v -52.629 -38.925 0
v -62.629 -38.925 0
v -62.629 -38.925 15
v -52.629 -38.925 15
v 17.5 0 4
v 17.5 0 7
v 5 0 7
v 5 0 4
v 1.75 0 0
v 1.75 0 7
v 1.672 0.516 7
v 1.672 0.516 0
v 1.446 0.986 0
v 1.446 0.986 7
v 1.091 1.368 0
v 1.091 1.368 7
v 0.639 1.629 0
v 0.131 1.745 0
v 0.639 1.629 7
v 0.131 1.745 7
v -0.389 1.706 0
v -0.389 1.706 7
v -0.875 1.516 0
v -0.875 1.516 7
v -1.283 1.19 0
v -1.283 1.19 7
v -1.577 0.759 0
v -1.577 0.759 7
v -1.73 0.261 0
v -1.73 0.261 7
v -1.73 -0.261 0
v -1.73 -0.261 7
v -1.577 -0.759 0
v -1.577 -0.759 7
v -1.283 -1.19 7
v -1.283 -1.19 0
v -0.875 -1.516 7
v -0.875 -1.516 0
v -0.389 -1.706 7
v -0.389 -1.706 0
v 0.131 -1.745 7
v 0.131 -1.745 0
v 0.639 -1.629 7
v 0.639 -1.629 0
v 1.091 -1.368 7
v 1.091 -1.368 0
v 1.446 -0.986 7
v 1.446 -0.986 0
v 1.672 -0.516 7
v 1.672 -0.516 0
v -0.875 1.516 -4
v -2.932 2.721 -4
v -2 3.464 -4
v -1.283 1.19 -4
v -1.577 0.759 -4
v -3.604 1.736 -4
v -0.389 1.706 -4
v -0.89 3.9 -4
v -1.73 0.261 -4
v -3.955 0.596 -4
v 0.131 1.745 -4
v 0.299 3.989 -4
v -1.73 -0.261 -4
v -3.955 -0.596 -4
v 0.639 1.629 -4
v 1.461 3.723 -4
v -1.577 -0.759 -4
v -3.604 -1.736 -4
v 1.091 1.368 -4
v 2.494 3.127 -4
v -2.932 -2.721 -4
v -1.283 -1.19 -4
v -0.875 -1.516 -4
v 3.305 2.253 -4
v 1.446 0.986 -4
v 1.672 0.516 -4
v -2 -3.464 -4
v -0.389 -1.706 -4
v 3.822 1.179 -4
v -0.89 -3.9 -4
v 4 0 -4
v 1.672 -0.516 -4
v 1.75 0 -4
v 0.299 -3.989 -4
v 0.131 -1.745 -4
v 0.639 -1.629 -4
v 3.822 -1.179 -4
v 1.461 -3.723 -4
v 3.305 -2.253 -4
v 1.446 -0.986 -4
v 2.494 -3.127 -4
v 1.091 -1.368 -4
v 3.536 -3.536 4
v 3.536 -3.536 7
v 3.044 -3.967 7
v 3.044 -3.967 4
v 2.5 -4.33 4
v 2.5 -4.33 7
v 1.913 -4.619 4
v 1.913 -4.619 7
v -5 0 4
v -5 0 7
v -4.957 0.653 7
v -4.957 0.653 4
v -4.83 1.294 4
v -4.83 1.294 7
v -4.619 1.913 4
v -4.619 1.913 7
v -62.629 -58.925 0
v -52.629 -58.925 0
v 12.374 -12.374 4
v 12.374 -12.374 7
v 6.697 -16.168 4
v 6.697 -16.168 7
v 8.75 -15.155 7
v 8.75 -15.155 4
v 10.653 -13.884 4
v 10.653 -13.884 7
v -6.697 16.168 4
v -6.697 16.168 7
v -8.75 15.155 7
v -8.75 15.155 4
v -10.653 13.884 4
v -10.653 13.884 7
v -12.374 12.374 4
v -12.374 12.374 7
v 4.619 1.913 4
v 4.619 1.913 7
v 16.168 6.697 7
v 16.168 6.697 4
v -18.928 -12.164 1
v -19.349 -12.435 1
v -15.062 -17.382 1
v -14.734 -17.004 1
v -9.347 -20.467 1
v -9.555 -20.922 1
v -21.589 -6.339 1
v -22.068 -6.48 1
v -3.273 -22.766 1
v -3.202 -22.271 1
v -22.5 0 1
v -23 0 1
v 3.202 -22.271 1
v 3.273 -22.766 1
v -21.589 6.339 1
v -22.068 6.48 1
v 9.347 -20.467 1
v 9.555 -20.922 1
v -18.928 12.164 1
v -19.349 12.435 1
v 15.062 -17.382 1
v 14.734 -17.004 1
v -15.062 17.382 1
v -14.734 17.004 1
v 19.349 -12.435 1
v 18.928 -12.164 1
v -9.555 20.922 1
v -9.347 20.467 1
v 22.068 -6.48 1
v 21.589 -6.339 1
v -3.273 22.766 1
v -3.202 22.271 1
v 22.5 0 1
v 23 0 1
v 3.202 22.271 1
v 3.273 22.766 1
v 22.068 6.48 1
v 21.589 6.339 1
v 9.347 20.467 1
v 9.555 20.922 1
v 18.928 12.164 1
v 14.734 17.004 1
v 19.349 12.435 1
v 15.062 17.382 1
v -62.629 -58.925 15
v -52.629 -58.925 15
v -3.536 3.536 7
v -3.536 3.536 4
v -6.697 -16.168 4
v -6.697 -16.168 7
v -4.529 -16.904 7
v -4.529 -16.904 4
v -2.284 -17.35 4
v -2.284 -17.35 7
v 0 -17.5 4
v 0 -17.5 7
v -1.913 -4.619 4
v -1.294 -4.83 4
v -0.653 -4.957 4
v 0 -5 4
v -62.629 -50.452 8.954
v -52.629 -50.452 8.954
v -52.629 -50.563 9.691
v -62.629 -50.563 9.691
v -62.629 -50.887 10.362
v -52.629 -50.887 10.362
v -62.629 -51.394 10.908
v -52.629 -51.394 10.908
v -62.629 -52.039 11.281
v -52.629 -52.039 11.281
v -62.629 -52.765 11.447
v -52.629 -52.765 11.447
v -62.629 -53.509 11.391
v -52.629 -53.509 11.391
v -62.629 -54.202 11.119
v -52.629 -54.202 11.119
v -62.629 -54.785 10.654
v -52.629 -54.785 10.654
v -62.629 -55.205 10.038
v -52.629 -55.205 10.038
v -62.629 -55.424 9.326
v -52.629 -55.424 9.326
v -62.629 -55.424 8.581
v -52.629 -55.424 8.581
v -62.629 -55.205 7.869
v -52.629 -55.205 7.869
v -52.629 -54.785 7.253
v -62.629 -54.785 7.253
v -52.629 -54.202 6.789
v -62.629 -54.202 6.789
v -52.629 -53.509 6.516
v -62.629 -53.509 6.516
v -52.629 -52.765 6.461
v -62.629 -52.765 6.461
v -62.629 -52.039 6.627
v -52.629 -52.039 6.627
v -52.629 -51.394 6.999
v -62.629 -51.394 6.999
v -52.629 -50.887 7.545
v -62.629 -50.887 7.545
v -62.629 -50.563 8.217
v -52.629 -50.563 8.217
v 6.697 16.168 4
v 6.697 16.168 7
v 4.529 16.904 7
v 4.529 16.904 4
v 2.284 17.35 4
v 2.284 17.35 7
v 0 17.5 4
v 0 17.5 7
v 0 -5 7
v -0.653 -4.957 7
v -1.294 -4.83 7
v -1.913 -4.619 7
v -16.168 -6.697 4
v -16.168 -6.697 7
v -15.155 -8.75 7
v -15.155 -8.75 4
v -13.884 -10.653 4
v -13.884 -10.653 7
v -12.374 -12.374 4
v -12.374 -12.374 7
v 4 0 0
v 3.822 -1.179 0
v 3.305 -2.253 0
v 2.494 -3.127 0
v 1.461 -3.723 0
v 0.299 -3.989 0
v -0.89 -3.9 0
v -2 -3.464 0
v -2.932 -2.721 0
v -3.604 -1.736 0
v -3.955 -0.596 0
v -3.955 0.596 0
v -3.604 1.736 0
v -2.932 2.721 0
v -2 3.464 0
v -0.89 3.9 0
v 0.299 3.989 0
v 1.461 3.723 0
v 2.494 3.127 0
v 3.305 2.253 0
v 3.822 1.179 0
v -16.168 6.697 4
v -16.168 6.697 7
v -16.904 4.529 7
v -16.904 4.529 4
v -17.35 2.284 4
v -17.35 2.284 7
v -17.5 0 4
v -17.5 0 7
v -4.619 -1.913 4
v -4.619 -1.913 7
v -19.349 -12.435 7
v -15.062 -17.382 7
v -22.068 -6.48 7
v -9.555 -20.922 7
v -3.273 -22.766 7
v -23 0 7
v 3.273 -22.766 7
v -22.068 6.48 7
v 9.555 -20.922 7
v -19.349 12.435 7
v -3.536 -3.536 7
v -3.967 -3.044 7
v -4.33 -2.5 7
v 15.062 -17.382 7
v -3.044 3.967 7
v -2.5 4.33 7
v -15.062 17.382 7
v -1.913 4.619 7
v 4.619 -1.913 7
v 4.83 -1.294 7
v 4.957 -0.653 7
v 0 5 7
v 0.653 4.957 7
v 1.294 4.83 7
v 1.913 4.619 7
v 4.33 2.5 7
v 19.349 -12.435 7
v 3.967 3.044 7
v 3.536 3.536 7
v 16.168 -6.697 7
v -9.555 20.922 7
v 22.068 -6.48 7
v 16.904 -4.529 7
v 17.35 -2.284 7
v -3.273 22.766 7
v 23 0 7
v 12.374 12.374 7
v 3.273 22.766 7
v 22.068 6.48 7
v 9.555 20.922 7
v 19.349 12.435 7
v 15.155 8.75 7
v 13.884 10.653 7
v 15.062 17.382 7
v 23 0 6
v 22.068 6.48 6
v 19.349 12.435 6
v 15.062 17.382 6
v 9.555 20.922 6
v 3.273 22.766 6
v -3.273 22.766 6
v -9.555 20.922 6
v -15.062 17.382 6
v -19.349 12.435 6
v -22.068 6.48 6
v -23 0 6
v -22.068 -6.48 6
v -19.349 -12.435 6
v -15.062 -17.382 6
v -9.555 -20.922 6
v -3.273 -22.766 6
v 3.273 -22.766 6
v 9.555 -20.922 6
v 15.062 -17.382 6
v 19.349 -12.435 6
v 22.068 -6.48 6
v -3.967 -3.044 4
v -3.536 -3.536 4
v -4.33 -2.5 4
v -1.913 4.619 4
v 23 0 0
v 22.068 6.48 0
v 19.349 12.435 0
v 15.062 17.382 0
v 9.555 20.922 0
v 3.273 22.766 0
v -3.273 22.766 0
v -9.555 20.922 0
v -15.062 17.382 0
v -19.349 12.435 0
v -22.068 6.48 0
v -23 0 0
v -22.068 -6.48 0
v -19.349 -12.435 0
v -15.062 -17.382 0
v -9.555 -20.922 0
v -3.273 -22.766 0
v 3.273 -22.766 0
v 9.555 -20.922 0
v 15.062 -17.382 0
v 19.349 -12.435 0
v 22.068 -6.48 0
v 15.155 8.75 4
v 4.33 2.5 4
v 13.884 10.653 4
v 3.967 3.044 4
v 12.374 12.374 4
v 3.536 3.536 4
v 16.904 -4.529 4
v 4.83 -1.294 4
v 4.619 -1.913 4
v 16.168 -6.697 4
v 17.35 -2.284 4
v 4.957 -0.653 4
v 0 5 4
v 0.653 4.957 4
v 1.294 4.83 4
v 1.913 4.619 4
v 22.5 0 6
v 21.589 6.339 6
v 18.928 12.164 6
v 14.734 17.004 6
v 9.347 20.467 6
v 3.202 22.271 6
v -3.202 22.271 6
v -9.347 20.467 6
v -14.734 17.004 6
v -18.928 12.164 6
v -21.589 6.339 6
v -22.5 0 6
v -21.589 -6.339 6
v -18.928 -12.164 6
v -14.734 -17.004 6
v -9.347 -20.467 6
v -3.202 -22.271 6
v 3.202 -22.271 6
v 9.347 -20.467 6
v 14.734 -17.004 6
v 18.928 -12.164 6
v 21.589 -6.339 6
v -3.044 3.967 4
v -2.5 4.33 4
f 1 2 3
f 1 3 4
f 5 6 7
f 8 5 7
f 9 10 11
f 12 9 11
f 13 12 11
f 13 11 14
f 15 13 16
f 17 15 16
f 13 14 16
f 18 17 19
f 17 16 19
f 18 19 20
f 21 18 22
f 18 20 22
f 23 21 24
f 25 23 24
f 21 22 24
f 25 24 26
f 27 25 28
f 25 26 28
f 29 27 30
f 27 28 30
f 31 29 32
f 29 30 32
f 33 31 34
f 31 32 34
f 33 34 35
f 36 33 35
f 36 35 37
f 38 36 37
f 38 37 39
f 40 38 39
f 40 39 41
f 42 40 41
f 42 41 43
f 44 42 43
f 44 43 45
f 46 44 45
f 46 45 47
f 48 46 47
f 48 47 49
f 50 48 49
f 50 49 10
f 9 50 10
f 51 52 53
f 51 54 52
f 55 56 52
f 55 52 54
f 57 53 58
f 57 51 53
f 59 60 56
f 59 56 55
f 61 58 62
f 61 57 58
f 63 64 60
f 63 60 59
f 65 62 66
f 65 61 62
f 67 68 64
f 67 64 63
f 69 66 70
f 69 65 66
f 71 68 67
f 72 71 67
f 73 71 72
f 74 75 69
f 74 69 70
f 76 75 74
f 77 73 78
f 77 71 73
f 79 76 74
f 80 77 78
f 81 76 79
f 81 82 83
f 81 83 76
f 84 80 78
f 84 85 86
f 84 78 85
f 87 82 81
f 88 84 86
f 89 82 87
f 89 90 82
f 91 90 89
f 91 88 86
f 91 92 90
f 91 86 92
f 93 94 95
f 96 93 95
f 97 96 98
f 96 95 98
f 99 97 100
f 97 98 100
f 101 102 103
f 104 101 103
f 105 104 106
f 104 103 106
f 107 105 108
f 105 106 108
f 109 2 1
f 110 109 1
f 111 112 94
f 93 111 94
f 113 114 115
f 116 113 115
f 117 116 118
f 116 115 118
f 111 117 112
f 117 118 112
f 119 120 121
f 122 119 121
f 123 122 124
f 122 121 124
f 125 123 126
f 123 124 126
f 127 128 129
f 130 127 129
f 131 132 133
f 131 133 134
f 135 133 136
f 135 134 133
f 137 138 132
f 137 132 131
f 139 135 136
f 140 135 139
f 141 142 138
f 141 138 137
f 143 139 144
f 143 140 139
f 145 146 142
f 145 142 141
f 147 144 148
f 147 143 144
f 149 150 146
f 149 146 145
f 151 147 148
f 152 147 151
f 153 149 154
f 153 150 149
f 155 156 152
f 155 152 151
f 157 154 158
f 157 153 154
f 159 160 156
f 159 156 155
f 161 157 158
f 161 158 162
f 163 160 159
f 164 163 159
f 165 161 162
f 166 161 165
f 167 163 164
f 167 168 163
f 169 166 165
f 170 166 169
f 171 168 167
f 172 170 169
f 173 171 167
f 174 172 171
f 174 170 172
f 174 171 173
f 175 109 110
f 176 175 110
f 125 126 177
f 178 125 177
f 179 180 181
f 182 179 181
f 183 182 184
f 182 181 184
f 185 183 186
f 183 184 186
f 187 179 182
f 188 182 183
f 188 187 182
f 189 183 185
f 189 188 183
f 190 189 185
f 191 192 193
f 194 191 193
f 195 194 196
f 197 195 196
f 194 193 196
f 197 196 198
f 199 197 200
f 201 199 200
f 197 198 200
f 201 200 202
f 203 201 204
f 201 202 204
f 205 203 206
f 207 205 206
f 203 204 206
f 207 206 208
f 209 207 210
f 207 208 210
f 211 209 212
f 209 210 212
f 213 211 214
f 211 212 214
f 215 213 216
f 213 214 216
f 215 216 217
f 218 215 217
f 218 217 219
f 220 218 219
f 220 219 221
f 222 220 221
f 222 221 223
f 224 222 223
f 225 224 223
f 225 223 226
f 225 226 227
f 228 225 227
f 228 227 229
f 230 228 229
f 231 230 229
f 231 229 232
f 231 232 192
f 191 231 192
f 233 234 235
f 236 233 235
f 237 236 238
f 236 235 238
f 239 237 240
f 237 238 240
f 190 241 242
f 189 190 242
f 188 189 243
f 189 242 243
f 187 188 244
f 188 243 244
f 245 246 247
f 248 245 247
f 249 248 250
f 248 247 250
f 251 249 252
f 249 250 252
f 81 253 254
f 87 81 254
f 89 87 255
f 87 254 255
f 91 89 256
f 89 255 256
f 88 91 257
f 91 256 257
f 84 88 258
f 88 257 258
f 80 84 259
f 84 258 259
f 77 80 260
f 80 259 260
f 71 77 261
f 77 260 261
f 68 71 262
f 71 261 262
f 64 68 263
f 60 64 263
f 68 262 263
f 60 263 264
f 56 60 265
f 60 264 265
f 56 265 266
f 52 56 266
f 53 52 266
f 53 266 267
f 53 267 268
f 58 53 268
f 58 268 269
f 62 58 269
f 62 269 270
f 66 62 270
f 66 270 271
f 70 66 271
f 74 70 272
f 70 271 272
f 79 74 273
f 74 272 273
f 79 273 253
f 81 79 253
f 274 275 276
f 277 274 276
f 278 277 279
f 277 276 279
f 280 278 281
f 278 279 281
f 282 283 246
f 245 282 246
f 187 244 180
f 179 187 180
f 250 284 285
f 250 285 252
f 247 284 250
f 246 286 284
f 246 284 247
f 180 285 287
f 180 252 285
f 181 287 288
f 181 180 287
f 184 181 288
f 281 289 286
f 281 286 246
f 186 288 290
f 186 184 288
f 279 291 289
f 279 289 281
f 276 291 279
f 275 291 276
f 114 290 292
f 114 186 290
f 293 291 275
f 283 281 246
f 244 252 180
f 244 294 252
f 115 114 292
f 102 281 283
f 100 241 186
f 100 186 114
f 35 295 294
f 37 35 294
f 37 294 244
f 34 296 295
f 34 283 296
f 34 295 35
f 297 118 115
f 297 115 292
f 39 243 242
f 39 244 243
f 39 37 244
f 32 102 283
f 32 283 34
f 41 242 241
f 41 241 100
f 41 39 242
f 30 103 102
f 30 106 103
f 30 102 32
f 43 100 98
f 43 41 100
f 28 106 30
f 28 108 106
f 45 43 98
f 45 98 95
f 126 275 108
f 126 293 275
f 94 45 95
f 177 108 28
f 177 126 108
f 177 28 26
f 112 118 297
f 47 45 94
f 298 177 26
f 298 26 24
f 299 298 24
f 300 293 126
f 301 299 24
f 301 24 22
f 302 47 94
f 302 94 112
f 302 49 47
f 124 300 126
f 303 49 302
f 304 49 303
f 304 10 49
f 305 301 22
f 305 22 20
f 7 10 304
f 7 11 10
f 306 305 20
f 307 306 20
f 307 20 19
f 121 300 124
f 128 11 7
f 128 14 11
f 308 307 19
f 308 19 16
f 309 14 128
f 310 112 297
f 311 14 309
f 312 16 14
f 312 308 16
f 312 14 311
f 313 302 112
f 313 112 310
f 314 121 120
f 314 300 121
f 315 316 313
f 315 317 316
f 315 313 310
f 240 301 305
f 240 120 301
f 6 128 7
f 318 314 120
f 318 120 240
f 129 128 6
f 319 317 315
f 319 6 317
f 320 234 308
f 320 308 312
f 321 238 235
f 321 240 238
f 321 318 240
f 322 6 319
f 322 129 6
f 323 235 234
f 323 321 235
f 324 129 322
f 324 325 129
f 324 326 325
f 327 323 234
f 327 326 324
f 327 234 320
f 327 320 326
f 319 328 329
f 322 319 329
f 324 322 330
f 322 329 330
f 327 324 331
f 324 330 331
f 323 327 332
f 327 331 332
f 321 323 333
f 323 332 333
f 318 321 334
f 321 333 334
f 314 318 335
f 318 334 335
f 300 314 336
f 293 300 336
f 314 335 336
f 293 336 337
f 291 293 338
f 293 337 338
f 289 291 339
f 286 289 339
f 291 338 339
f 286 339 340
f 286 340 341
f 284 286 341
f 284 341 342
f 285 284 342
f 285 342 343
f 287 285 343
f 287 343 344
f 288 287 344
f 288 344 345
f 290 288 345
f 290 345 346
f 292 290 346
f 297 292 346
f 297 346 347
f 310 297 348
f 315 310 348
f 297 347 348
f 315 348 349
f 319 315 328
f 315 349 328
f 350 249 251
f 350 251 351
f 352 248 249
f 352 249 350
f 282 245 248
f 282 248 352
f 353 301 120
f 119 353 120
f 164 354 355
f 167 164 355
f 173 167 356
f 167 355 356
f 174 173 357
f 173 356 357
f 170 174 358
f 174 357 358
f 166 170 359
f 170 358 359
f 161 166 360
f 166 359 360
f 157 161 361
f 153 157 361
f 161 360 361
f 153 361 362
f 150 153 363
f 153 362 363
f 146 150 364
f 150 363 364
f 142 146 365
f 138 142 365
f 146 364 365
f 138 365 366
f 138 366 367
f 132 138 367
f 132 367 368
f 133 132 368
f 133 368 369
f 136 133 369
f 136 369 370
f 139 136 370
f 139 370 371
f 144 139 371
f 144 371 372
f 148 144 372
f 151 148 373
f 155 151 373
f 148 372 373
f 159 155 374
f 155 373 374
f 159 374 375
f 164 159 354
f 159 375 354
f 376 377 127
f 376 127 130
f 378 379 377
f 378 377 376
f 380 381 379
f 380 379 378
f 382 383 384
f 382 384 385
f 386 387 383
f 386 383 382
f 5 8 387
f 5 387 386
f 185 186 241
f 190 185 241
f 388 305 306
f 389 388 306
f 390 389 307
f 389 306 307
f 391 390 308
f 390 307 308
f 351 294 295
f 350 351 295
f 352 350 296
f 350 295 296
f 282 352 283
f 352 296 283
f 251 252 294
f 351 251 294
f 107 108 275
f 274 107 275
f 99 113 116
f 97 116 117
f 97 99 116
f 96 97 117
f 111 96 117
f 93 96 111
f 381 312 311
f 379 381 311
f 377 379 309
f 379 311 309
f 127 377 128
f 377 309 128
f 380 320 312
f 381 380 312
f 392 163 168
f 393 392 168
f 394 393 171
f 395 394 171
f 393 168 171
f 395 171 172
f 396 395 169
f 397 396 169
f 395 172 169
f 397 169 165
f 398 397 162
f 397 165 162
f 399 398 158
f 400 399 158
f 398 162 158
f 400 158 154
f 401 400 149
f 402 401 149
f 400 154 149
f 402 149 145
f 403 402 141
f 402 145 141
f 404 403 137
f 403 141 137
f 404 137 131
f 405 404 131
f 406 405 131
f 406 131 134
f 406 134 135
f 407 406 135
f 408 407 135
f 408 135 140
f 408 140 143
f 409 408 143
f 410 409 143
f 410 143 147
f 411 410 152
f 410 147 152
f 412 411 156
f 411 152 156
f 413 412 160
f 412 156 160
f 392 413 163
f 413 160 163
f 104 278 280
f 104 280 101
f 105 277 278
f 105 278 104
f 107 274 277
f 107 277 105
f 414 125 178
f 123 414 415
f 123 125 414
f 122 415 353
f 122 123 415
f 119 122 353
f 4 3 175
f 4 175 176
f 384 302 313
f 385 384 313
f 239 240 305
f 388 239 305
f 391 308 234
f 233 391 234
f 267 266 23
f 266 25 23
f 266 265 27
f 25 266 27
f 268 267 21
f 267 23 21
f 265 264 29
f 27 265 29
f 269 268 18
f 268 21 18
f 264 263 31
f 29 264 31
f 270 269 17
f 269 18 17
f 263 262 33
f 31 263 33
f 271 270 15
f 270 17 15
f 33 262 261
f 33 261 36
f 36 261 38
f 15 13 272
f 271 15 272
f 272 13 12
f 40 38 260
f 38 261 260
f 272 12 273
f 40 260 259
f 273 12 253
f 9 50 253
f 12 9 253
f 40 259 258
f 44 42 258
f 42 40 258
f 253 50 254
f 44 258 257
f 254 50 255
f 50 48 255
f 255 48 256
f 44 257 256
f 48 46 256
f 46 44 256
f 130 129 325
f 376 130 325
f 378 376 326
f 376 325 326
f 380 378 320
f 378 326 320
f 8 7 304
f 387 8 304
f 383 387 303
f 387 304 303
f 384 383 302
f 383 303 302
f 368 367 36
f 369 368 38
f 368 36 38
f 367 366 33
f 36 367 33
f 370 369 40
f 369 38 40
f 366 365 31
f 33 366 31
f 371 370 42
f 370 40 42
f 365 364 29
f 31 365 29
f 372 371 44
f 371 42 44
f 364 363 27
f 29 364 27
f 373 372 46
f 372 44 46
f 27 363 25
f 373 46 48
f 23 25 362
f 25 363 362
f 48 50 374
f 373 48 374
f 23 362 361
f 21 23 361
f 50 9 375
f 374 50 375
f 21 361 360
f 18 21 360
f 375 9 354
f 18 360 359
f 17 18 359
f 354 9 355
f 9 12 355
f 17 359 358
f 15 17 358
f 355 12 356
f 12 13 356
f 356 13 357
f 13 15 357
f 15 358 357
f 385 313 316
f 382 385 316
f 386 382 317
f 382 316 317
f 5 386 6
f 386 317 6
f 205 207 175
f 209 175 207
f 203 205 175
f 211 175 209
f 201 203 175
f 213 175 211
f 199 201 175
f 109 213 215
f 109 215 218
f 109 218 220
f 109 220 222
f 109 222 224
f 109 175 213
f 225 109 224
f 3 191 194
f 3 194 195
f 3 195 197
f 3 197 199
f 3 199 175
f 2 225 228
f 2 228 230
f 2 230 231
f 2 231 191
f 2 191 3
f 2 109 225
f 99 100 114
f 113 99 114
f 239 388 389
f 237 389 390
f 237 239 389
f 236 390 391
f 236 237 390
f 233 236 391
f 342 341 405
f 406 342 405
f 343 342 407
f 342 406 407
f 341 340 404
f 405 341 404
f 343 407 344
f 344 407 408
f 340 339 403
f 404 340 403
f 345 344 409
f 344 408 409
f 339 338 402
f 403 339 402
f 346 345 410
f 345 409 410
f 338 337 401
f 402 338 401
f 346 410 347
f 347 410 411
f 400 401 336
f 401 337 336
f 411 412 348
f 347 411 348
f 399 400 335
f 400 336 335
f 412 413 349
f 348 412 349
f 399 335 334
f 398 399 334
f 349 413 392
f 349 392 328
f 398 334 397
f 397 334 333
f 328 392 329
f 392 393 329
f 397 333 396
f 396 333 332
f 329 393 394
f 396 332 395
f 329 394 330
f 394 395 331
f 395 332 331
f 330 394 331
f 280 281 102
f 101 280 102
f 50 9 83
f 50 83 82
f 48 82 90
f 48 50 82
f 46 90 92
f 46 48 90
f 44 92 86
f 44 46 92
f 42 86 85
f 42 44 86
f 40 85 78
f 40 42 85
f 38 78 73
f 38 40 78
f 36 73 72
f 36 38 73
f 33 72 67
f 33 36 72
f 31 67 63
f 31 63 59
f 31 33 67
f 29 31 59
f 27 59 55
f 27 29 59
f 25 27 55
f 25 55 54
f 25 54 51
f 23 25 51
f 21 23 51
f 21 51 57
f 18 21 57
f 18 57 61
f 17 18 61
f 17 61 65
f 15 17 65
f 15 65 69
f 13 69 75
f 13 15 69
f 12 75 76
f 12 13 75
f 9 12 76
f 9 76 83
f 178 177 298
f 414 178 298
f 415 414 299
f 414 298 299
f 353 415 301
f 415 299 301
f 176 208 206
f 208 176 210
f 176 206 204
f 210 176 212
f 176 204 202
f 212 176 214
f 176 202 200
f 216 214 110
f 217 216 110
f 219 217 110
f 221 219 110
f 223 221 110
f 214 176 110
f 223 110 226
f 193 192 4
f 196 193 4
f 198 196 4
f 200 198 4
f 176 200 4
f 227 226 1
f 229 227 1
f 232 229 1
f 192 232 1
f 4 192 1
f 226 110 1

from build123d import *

# Parameters (mm, degrees)
F0_R      = 23
F1_DEPTH  = 1
F2_R      = 22.5
F3_DEPTH  = 5
F4_R      = 23
F4_R_2    = 22.5
F5_DEPTH  = 1
F6_R      = 1.75
F7_DEPTH  = 25
F9_DEPTH  = 3
F10_R     = 4
F10_R_2   = 1.75
F11_DEPTH = 4
F12_W     = 10
F12_H     = 20
F13_DEPTH = 15
F14_R     = 2.5
F15_DEPTH = 25


with BuildPart() as f1:
    # F0 (on Top) → F1 (new body)
    with BuildSketch(Plane.XY):
        Circle(F0_R)
    extrude(amount=F1_DEPTH)

    # F2 (on face) → F3 (join)
    with BuildSketch(Plane.XY.offset(1)):
        Circle(F2_R)
    extrude(amount=F3_DEPTH)

    # F4 (on face) → F5 (join)
    with BuildSketch(Plane.XY.offset(6)):
        Circle(F4_R)
        Circle(F4_R_2, mode=Mode.SUBTRACT)
        Circle(F4_R_2)
    extrude(amount=F5_DEPTH)

    # F6 (on face) → F7 (cut)
    with BuildSketch(Plane.XY.offset(7)):
        Circle(F6_R)
    extrude(amount=-F7_DEPTH, mode=Mode.SUBTRACT)

    # F8 (on face) → F9 (cut)
    with BuildSketch(Plane.XY.offset(7)):
        with BuildLine():
            ThreePointArc((0, 5), (0.9754516101, 4.903926402), (1.9134171618, 4.6193976626))
            Line((1.9134171618, 4.6193976626), (6.6969600664, 16.1678918189))
            ThreePointArc((6.6969600664, 16.1678918189), (3.4140806353, 17.1637424071), (0, 17.5))
            Line((0, 17.5), (0, 5))
        make_face()
        with BuildLine():
            ThreePointArc((3.5355339059, 3.5355339059), (4.1573480615, 2.7778511651), (4.6193976626, 1.9134171618))
            Line((4.6193976626, 1.9134171618), (16.1678918189, 6.6969600664))
            ThreePointArc((16.1678918189, 6.6969600664), (14.5507182153, 9.7224790778), (12.3743686708, 12.3743686708))
            Line((12.3743686708, 12.3743686708), (3.5355339059, 3.5355339059))
        make_face()
        with BuildLine():
            Line((17.5, 0), (5, 0))
            ThreePointArc((5, 0), (4.903926402, -0.9754516101), (4.6193976626, -1.9134171618))
            Line((4.6193976626, -1.9134171618), (16.1678918189, -6.6969600664))
            ThreePointArc((16.1678918189, -6.6969600664), (17.1637424071, -3.4140806353), (17.5, 0))
        make_face()
        with BuildLine():
            Line((12.3743686708, -12.3743686708), (3.5355339059, -3.5355339059))
            ThreePointArc((3.5355339059, -3.5355339059), (2.7778511651, -4.1573480615), (1.9134171618, -4.6193976626))
            Line((1.9134171618, -4.6193976626), (6.6969600664, -16.1678918189))
            ThreePointArc((6.6969600664, -16.1678918189), (9.7224790778, -14.5507182153), (12.3743686708, -12.3743686708))
        make_face()
        with BuildLine():
            Line((0, -17.5), (0, -5))
            ThreePointArc((0, -5), (-0.9754516101, -4.903926402), (-1.9134171618, -4.6193976626))
            Line((-1.9134171618, -4.6193976626), (-6.6969600664, -16.1678918189))
            ThreePointArc((-6.6969600664, -16.1678918189), (-3.4140806353, -17.1637424071), (0, -17.5))
        make_face()
        with BuildLine():
            ThreePointArc((-3.5355339059, -3.5355339059), (-4.1573480615, -2.7778511651), (-4.6193976626, -1.9134171618))
            Line((-4.6193976626, -1.9134171618), (-16.1678918189, -6.6969600664))
            ThreePointArc((-16.1678918189, -6.6969600664), (-14.5507182153, -9.7224790778), (-12.3743686708, -12.3743686708))
            Line((-12.3743686708, -12.3743686708), (-3.5355339059, -3.5355339059))
        make_face()
        with BuildLine():
            ThreePointArc((-5, 0), (-4.903926402, 0.9754516101), (-4.6193976626, 1.9134171618))
            Line((-4.6193976626, 1.9134171618), (-16.1678918189, 6.6969600664))
            ThreePointArc((-16.1678918189, 6.6969600664), (-17.1637424071, 3.4140806353), (-17.5, 0))
            Line((-17.5, 0), (-5, 0))
        make_face()
        with BuildLine():
            ThreePointArc((-3.5355339059, 3.5355339059), (-2.7778511651, 4.1573480615), (-1.9134171618, 4.6193976626))
            Line((-1.9134171618, 4.6193976626), (-6.6969600664, 16.1678918189))
            ThreePointArc((-6.6969600664, 16.1678918189), (-9.7224790778, 14.5507182153), (-12.3743686708, 12.3743686708))
            Line((-12.3743686708, 12.3743686708), (-3.5355339059, 3.5355339059))
        make_face()
    extrude(amount=-F9_DEPTH, mode=Mode.SUBTRACT)


with BuildPart() as f11:
    # F10 (on face) → F11 (new body)
    with BuildSketch(Plane(origin=(0, 0, 0), x_dir=(1, 0, 0), z_dir=(0, 0, -1))):
        Circle(F10_R)
        Circle(F10_R_2, mode=Mode.SUBTRACT)
    extrude(amount=F11_DEPTH)


with BuildPart() as f13:
    # F12 (on Top) → F13 (new body)
    with BuildSketch(Plane.XY):
        with Locations((-57.6293793321, -48.9252449572)):
            Rectangle(F12_W, F12_H)
    extrude(amount=F13_DEPTH)

    # F14 (on face) → F15 (cut)
    with BuildSketch(Plane.YZ.offset(-52.6293793321)):
        with Locations((-52.9523044825, 8.9537883177)):
            Circle(F14_R)
    extrude(amount=-F15_DEPTH, mode=Mode.SUBTRACT)


solid = Compound([f1.part, f11.part, f13.part])
